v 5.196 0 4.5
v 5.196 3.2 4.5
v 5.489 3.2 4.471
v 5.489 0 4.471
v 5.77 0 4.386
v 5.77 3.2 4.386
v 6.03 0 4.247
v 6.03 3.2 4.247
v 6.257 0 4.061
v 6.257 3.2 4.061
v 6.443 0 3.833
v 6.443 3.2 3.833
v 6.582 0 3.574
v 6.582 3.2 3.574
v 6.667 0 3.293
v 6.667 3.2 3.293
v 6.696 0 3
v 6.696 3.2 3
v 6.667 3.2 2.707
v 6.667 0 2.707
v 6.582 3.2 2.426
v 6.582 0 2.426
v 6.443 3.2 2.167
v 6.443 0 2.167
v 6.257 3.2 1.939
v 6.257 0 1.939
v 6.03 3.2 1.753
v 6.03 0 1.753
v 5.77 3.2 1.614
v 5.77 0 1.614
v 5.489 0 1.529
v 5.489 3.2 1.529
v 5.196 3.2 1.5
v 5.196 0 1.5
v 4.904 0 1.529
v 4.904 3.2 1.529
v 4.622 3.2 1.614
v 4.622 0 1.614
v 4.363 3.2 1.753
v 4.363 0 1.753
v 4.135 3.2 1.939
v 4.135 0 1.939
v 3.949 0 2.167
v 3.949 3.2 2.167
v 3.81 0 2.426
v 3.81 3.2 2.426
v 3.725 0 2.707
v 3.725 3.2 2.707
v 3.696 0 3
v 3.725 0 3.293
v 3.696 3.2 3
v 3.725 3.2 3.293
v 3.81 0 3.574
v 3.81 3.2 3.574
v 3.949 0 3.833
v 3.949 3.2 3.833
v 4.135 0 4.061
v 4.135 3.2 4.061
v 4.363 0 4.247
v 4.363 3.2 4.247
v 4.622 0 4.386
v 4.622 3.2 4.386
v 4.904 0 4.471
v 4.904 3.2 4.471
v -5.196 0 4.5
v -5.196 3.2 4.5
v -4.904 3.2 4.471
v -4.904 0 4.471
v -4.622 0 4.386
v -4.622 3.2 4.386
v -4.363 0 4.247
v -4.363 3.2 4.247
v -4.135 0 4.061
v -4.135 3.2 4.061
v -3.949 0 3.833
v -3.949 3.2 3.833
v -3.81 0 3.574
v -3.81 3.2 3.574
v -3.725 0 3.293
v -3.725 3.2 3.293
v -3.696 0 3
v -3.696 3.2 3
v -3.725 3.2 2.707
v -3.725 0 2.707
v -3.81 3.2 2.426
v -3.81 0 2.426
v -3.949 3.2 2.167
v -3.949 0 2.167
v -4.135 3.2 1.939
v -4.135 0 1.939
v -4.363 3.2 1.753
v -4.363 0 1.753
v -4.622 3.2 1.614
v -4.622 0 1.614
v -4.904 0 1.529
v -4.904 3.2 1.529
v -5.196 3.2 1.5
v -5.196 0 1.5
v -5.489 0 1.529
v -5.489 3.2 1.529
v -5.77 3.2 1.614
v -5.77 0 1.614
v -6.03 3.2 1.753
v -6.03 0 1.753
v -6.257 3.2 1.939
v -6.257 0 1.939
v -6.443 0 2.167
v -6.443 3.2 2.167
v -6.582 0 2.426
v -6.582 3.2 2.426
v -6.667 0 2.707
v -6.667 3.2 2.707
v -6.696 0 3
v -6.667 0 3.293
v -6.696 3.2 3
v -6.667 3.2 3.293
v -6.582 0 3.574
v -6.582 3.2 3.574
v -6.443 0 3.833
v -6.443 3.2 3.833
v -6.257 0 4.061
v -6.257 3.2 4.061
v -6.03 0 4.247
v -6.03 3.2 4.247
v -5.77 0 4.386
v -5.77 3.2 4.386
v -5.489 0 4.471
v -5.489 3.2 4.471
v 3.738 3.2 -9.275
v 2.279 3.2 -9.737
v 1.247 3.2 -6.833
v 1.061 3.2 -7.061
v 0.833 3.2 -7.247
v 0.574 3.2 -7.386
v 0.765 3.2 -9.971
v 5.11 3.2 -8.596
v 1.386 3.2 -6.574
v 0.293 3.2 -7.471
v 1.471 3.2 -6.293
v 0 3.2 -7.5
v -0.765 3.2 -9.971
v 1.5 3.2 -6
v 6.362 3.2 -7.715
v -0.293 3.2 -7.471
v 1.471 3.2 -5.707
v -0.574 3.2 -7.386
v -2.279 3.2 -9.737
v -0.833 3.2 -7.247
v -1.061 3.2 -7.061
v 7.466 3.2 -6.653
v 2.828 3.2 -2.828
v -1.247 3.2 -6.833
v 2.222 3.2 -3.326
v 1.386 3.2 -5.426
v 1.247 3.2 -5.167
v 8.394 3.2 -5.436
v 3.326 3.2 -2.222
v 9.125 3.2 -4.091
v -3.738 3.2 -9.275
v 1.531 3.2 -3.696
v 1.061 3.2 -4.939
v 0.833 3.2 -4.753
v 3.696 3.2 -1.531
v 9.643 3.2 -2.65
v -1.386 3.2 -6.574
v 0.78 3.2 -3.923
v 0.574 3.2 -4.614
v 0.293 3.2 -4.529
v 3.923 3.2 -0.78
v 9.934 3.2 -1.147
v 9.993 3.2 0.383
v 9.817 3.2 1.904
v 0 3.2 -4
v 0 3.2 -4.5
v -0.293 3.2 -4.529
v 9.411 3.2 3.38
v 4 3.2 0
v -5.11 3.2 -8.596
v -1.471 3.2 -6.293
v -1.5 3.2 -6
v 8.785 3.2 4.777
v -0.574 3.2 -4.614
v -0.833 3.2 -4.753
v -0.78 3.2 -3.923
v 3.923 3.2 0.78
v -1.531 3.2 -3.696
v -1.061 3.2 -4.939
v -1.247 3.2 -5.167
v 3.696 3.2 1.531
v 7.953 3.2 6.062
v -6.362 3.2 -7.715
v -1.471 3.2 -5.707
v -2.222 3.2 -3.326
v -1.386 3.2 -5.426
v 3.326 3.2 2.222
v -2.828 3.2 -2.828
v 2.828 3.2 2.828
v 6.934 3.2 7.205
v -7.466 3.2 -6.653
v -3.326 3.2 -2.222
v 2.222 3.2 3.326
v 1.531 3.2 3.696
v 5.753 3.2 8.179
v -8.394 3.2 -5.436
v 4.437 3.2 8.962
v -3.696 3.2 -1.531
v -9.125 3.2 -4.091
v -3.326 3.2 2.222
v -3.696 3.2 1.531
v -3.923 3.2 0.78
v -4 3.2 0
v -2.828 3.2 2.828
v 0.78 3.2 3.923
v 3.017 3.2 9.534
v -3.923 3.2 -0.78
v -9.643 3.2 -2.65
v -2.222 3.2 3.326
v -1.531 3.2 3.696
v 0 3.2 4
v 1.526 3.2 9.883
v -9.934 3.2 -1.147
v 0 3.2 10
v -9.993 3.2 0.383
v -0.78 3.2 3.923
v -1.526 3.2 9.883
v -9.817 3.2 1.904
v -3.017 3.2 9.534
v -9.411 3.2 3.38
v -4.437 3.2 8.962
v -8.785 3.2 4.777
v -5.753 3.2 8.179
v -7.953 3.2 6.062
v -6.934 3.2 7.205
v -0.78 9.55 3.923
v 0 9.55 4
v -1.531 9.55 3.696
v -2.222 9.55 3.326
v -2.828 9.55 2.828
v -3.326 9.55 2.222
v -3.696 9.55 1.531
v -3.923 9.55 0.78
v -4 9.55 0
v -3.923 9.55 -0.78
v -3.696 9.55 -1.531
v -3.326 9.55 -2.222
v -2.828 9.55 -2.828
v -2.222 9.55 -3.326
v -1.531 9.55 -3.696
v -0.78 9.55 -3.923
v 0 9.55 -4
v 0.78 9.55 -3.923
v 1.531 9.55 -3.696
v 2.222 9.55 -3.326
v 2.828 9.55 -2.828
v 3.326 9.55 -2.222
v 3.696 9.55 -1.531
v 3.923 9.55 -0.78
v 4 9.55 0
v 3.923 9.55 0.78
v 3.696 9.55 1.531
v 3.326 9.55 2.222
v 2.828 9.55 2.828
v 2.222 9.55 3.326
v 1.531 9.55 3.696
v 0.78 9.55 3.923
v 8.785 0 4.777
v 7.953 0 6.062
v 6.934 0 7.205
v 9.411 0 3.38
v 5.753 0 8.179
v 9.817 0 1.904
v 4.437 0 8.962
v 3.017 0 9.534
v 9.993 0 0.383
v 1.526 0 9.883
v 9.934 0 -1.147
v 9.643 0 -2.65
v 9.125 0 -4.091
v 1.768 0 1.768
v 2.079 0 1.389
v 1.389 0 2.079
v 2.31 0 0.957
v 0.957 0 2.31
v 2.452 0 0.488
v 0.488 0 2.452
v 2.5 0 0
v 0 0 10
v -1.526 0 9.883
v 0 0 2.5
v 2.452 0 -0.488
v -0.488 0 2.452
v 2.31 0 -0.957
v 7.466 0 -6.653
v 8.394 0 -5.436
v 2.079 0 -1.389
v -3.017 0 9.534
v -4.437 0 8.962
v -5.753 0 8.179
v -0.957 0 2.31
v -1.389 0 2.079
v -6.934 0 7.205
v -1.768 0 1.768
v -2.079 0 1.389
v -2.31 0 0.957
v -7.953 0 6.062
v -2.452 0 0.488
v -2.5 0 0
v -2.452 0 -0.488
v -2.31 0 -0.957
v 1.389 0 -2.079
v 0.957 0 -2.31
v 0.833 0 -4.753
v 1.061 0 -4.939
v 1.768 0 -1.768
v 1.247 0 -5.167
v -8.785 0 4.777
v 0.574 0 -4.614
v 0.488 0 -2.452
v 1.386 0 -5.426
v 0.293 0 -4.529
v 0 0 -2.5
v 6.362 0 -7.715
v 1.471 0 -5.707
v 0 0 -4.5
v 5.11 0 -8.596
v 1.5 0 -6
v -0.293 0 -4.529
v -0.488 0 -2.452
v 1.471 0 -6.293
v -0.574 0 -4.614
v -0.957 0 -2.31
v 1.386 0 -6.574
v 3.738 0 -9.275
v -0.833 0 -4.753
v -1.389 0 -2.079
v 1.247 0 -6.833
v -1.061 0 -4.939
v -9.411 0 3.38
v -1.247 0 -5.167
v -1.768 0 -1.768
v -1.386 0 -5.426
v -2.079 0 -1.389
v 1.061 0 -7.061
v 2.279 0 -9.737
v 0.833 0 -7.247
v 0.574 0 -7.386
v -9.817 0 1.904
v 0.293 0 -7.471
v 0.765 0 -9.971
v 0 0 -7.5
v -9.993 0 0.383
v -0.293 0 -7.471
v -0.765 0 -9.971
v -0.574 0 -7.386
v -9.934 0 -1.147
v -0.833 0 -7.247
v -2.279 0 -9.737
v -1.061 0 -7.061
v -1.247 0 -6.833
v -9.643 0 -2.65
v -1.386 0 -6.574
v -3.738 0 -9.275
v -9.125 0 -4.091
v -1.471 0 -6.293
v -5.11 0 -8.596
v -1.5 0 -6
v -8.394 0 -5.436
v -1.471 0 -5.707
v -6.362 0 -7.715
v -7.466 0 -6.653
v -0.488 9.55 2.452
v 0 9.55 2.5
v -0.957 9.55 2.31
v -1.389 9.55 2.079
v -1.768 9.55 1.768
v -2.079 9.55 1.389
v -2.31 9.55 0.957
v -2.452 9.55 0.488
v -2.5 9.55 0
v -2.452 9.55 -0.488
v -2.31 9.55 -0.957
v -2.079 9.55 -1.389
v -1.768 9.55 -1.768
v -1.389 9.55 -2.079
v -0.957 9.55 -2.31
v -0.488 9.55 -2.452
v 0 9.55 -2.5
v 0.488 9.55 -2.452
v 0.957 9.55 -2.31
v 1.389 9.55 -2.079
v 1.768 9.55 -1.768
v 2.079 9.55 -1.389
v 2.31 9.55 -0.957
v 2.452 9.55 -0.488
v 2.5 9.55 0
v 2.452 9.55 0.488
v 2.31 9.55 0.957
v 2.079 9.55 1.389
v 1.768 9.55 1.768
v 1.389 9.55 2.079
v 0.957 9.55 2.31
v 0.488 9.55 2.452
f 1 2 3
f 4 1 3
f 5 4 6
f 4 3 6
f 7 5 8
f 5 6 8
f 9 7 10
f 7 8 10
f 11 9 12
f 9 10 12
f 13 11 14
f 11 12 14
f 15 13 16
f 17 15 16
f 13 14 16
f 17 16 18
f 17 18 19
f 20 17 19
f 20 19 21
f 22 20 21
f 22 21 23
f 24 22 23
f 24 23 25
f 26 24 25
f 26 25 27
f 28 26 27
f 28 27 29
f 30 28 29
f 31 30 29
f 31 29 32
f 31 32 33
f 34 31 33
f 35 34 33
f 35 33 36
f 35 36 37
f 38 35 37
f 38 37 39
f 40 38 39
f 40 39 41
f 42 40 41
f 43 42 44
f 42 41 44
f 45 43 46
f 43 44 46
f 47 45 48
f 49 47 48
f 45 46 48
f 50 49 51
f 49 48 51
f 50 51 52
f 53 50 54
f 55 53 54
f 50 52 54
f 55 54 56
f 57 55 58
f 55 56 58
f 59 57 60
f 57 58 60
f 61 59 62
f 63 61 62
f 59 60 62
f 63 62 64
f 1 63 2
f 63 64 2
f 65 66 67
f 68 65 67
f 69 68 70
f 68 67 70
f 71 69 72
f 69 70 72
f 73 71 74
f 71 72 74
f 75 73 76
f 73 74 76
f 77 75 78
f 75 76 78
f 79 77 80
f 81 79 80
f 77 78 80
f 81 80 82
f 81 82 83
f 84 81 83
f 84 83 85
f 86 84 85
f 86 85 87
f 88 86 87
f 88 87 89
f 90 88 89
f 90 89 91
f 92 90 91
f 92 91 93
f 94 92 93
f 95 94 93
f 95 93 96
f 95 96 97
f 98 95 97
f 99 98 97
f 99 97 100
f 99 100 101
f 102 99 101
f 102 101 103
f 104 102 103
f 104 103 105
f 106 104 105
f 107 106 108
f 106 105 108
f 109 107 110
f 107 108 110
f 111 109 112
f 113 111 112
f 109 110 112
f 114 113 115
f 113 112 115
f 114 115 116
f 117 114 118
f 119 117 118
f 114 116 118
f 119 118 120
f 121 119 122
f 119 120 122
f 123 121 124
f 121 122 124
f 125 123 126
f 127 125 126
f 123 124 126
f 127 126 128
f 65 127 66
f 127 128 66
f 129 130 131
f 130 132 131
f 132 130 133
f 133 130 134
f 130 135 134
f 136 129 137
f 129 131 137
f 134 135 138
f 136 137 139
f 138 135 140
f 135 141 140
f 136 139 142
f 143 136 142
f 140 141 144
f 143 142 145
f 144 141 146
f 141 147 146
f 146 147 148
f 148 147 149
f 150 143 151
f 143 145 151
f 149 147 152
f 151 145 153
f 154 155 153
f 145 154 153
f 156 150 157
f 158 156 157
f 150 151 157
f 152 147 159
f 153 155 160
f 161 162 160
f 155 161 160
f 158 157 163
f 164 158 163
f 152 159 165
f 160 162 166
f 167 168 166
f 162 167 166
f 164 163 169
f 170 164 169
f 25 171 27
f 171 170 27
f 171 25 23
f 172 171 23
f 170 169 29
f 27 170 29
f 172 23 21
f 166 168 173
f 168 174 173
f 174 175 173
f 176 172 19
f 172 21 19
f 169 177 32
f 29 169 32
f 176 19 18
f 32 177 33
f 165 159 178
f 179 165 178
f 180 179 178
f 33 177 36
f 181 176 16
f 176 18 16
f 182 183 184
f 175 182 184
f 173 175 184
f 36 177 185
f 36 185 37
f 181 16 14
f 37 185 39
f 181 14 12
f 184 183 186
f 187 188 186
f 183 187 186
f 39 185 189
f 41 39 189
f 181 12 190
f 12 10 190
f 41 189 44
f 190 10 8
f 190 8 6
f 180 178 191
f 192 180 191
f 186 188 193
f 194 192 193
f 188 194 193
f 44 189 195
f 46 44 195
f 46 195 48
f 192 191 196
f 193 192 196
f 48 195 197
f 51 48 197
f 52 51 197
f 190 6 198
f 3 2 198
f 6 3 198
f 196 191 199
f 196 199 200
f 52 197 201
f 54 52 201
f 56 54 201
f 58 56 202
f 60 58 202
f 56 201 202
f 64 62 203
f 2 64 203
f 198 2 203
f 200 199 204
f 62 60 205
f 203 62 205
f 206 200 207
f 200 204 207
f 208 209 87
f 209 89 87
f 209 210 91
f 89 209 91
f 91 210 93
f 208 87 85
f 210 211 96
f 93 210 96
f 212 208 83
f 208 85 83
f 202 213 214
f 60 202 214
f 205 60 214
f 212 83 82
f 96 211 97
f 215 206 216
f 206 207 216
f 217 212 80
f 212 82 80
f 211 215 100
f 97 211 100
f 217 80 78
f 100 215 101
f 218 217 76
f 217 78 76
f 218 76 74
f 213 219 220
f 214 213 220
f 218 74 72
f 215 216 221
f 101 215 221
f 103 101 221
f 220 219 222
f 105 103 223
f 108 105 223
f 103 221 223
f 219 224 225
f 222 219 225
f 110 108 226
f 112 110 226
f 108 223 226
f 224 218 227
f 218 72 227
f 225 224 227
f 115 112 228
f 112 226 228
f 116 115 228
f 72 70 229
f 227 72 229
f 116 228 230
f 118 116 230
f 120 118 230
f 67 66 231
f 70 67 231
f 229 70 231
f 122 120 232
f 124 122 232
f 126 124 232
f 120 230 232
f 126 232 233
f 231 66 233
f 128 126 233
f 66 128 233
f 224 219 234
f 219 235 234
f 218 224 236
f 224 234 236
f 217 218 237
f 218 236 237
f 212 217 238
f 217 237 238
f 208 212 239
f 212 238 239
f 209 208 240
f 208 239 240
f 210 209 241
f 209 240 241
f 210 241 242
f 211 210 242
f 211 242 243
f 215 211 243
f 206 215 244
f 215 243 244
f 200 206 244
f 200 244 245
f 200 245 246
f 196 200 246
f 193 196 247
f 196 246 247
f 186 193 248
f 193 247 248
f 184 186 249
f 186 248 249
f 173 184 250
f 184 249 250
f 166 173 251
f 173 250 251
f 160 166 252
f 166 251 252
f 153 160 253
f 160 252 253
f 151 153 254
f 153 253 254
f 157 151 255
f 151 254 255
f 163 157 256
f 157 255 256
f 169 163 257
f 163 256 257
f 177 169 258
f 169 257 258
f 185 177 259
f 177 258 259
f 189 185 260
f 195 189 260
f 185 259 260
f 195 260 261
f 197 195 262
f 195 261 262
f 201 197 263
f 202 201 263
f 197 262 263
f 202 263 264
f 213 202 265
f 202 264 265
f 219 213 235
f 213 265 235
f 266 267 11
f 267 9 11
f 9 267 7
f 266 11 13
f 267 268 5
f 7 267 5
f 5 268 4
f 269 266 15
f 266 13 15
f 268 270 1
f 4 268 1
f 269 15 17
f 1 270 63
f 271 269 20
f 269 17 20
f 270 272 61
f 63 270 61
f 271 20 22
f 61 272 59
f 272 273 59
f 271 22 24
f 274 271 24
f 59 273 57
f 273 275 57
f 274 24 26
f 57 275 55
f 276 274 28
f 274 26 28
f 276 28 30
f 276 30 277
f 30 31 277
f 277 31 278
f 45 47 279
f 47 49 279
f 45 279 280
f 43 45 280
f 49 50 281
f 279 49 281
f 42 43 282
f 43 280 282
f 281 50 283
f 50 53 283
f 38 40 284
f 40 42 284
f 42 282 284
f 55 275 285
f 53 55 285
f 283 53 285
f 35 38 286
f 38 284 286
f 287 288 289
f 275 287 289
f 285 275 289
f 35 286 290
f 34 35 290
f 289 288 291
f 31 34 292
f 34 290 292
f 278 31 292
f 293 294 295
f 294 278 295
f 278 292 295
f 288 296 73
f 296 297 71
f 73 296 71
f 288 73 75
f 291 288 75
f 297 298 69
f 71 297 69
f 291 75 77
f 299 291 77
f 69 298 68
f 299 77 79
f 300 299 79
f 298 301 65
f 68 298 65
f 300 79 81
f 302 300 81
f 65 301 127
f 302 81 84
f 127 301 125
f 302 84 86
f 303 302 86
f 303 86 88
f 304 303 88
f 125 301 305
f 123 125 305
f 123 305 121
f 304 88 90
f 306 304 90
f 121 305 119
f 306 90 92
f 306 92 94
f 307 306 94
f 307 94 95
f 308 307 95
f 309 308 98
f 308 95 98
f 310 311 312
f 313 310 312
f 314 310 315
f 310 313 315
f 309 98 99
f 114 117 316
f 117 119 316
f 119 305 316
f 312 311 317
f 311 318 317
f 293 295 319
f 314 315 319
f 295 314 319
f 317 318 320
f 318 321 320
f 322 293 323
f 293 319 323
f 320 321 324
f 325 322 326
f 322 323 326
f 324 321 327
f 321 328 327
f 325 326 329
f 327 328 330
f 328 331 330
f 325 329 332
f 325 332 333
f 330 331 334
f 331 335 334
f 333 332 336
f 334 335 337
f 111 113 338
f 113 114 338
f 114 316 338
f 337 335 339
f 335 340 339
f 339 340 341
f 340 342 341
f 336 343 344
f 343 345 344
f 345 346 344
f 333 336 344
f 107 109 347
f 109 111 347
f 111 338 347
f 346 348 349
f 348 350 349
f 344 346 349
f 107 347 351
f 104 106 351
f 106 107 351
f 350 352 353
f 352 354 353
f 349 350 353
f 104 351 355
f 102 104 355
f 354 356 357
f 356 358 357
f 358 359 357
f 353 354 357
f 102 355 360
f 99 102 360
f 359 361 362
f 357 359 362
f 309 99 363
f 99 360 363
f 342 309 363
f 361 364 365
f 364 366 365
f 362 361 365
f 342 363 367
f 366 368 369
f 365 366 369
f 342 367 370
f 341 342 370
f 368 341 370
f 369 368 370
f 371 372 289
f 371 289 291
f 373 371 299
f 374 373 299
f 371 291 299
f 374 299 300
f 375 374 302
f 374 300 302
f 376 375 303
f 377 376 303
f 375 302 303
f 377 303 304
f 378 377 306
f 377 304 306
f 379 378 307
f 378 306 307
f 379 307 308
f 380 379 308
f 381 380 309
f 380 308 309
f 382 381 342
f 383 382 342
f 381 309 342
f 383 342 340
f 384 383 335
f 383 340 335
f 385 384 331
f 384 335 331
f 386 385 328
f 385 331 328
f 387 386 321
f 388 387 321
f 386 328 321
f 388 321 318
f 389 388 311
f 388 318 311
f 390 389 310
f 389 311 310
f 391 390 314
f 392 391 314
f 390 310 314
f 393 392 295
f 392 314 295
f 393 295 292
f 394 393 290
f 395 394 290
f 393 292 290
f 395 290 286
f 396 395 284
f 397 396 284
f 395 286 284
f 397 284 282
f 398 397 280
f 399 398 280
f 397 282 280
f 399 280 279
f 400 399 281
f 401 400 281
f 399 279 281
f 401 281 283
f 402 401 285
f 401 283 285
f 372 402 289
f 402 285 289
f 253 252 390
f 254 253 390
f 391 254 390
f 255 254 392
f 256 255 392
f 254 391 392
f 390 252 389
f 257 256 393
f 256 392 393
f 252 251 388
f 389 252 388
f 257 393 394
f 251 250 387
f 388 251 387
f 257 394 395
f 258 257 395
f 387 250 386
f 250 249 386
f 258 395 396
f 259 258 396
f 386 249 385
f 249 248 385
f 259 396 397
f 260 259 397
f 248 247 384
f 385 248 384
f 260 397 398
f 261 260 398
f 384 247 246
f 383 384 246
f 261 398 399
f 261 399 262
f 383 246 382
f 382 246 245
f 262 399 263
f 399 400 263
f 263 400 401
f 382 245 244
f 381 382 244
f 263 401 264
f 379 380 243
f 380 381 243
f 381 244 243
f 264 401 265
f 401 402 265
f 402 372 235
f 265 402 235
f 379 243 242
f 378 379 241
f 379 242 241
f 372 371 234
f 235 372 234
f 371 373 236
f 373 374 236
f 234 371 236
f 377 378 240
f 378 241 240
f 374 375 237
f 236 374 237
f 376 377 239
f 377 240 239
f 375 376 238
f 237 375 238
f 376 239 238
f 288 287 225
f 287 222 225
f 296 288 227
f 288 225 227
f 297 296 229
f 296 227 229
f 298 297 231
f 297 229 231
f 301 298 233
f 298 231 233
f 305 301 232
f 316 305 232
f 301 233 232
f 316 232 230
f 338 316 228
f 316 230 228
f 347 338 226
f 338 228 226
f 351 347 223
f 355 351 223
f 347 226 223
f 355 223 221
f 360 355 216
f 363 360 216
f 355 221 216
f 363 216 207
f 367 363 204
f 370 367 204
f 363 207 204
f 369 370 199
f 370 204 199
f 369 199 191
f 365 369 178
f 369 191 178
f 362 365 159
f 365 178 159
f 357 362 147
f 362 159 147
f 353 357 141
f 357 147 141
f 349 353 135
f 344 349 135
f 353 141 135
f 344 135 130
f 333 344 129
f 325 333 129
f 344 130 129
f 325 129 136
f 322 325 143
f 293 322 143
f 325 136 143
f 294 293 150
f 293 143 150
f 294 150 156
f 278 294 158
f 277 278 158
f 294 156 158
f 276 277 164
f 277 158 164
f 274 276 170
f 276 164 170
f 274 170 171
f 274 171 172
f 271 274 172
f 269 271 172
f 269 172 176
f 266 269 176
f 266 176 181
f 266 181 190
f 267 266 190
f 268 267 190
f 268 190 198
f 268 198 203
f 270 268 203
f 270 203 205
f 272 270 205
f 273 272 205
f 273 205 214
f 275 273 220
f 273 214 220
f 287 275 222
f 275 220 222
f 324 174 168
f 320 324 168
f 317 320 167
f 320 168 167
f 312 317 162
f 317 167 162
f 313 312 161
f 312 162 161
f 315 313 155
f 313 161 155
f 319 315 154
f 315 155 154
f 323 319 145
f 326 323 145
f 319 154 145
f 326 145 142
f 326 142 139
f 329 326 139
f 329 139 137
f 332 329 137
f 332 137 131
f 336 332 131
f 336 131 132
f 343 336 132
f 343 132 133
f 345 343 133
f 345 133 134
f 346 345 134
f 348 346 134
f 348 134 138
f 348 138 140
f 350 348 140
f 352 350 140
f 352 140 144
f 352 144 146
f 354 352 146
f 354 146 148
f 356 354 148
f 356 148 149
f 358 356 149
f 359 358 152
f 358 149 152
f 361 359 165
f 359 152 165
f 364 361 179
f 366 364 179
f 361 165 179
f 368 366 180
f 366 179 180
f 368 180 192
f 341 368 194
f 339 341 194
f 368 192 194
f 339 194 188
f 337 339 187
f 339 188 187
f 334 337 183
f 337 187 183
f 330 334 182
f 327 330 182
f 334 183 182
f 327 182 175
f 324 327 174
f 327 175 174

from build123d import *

# Parameters (mm, degrees)
SKETCH2_R          = 1.5
CUT_EXTRUDE1_DEPTH = 16.502338533


with BuildPart() as part:
    # Sketch1 → Revolve1 (revolve)
    with BuildSketch(Plane.XY, mode=Mode.PRIVATE) as revolve1_sk:
        Polygon((-2.5, 9.55), (-2.5, 0), (-10, 0), (-10, 3.2), (-4, 3.2), (-4, 9.55), align=None)
    revolve(revolve1_sk.sketch.rotate(Axis((0, 12.509773994, 0), (0, -1, 0)), 270), axis=Axis((0, 12.509773994, 0), (0, -1, 0)))

    # Sketch2 → Cut-Extrude1 (cut, through all)
    with BuildSketch(Plane(origin=(0, 3.2, 0), x_dir=(1, 0, 0), z_dir=(0, 1, 0))):
        with Locations(Location((0, 6, 0), (0, 0, 270))):
            Circle(SKETCH2_R)
        with Locations(Location((5.196152423, -3, 0), (0, 0, 270))):
            Circle(SKETCH2_R)
        with Locations(Location((-5.196152423, -3, 0), (0, 0, 270))):
            Circle(SKETCH2_R)
    extrude(amount=-CUT_EXTRUDE1_DEPTH, mode=Mode.SUBTRACT)


solid = part.part
